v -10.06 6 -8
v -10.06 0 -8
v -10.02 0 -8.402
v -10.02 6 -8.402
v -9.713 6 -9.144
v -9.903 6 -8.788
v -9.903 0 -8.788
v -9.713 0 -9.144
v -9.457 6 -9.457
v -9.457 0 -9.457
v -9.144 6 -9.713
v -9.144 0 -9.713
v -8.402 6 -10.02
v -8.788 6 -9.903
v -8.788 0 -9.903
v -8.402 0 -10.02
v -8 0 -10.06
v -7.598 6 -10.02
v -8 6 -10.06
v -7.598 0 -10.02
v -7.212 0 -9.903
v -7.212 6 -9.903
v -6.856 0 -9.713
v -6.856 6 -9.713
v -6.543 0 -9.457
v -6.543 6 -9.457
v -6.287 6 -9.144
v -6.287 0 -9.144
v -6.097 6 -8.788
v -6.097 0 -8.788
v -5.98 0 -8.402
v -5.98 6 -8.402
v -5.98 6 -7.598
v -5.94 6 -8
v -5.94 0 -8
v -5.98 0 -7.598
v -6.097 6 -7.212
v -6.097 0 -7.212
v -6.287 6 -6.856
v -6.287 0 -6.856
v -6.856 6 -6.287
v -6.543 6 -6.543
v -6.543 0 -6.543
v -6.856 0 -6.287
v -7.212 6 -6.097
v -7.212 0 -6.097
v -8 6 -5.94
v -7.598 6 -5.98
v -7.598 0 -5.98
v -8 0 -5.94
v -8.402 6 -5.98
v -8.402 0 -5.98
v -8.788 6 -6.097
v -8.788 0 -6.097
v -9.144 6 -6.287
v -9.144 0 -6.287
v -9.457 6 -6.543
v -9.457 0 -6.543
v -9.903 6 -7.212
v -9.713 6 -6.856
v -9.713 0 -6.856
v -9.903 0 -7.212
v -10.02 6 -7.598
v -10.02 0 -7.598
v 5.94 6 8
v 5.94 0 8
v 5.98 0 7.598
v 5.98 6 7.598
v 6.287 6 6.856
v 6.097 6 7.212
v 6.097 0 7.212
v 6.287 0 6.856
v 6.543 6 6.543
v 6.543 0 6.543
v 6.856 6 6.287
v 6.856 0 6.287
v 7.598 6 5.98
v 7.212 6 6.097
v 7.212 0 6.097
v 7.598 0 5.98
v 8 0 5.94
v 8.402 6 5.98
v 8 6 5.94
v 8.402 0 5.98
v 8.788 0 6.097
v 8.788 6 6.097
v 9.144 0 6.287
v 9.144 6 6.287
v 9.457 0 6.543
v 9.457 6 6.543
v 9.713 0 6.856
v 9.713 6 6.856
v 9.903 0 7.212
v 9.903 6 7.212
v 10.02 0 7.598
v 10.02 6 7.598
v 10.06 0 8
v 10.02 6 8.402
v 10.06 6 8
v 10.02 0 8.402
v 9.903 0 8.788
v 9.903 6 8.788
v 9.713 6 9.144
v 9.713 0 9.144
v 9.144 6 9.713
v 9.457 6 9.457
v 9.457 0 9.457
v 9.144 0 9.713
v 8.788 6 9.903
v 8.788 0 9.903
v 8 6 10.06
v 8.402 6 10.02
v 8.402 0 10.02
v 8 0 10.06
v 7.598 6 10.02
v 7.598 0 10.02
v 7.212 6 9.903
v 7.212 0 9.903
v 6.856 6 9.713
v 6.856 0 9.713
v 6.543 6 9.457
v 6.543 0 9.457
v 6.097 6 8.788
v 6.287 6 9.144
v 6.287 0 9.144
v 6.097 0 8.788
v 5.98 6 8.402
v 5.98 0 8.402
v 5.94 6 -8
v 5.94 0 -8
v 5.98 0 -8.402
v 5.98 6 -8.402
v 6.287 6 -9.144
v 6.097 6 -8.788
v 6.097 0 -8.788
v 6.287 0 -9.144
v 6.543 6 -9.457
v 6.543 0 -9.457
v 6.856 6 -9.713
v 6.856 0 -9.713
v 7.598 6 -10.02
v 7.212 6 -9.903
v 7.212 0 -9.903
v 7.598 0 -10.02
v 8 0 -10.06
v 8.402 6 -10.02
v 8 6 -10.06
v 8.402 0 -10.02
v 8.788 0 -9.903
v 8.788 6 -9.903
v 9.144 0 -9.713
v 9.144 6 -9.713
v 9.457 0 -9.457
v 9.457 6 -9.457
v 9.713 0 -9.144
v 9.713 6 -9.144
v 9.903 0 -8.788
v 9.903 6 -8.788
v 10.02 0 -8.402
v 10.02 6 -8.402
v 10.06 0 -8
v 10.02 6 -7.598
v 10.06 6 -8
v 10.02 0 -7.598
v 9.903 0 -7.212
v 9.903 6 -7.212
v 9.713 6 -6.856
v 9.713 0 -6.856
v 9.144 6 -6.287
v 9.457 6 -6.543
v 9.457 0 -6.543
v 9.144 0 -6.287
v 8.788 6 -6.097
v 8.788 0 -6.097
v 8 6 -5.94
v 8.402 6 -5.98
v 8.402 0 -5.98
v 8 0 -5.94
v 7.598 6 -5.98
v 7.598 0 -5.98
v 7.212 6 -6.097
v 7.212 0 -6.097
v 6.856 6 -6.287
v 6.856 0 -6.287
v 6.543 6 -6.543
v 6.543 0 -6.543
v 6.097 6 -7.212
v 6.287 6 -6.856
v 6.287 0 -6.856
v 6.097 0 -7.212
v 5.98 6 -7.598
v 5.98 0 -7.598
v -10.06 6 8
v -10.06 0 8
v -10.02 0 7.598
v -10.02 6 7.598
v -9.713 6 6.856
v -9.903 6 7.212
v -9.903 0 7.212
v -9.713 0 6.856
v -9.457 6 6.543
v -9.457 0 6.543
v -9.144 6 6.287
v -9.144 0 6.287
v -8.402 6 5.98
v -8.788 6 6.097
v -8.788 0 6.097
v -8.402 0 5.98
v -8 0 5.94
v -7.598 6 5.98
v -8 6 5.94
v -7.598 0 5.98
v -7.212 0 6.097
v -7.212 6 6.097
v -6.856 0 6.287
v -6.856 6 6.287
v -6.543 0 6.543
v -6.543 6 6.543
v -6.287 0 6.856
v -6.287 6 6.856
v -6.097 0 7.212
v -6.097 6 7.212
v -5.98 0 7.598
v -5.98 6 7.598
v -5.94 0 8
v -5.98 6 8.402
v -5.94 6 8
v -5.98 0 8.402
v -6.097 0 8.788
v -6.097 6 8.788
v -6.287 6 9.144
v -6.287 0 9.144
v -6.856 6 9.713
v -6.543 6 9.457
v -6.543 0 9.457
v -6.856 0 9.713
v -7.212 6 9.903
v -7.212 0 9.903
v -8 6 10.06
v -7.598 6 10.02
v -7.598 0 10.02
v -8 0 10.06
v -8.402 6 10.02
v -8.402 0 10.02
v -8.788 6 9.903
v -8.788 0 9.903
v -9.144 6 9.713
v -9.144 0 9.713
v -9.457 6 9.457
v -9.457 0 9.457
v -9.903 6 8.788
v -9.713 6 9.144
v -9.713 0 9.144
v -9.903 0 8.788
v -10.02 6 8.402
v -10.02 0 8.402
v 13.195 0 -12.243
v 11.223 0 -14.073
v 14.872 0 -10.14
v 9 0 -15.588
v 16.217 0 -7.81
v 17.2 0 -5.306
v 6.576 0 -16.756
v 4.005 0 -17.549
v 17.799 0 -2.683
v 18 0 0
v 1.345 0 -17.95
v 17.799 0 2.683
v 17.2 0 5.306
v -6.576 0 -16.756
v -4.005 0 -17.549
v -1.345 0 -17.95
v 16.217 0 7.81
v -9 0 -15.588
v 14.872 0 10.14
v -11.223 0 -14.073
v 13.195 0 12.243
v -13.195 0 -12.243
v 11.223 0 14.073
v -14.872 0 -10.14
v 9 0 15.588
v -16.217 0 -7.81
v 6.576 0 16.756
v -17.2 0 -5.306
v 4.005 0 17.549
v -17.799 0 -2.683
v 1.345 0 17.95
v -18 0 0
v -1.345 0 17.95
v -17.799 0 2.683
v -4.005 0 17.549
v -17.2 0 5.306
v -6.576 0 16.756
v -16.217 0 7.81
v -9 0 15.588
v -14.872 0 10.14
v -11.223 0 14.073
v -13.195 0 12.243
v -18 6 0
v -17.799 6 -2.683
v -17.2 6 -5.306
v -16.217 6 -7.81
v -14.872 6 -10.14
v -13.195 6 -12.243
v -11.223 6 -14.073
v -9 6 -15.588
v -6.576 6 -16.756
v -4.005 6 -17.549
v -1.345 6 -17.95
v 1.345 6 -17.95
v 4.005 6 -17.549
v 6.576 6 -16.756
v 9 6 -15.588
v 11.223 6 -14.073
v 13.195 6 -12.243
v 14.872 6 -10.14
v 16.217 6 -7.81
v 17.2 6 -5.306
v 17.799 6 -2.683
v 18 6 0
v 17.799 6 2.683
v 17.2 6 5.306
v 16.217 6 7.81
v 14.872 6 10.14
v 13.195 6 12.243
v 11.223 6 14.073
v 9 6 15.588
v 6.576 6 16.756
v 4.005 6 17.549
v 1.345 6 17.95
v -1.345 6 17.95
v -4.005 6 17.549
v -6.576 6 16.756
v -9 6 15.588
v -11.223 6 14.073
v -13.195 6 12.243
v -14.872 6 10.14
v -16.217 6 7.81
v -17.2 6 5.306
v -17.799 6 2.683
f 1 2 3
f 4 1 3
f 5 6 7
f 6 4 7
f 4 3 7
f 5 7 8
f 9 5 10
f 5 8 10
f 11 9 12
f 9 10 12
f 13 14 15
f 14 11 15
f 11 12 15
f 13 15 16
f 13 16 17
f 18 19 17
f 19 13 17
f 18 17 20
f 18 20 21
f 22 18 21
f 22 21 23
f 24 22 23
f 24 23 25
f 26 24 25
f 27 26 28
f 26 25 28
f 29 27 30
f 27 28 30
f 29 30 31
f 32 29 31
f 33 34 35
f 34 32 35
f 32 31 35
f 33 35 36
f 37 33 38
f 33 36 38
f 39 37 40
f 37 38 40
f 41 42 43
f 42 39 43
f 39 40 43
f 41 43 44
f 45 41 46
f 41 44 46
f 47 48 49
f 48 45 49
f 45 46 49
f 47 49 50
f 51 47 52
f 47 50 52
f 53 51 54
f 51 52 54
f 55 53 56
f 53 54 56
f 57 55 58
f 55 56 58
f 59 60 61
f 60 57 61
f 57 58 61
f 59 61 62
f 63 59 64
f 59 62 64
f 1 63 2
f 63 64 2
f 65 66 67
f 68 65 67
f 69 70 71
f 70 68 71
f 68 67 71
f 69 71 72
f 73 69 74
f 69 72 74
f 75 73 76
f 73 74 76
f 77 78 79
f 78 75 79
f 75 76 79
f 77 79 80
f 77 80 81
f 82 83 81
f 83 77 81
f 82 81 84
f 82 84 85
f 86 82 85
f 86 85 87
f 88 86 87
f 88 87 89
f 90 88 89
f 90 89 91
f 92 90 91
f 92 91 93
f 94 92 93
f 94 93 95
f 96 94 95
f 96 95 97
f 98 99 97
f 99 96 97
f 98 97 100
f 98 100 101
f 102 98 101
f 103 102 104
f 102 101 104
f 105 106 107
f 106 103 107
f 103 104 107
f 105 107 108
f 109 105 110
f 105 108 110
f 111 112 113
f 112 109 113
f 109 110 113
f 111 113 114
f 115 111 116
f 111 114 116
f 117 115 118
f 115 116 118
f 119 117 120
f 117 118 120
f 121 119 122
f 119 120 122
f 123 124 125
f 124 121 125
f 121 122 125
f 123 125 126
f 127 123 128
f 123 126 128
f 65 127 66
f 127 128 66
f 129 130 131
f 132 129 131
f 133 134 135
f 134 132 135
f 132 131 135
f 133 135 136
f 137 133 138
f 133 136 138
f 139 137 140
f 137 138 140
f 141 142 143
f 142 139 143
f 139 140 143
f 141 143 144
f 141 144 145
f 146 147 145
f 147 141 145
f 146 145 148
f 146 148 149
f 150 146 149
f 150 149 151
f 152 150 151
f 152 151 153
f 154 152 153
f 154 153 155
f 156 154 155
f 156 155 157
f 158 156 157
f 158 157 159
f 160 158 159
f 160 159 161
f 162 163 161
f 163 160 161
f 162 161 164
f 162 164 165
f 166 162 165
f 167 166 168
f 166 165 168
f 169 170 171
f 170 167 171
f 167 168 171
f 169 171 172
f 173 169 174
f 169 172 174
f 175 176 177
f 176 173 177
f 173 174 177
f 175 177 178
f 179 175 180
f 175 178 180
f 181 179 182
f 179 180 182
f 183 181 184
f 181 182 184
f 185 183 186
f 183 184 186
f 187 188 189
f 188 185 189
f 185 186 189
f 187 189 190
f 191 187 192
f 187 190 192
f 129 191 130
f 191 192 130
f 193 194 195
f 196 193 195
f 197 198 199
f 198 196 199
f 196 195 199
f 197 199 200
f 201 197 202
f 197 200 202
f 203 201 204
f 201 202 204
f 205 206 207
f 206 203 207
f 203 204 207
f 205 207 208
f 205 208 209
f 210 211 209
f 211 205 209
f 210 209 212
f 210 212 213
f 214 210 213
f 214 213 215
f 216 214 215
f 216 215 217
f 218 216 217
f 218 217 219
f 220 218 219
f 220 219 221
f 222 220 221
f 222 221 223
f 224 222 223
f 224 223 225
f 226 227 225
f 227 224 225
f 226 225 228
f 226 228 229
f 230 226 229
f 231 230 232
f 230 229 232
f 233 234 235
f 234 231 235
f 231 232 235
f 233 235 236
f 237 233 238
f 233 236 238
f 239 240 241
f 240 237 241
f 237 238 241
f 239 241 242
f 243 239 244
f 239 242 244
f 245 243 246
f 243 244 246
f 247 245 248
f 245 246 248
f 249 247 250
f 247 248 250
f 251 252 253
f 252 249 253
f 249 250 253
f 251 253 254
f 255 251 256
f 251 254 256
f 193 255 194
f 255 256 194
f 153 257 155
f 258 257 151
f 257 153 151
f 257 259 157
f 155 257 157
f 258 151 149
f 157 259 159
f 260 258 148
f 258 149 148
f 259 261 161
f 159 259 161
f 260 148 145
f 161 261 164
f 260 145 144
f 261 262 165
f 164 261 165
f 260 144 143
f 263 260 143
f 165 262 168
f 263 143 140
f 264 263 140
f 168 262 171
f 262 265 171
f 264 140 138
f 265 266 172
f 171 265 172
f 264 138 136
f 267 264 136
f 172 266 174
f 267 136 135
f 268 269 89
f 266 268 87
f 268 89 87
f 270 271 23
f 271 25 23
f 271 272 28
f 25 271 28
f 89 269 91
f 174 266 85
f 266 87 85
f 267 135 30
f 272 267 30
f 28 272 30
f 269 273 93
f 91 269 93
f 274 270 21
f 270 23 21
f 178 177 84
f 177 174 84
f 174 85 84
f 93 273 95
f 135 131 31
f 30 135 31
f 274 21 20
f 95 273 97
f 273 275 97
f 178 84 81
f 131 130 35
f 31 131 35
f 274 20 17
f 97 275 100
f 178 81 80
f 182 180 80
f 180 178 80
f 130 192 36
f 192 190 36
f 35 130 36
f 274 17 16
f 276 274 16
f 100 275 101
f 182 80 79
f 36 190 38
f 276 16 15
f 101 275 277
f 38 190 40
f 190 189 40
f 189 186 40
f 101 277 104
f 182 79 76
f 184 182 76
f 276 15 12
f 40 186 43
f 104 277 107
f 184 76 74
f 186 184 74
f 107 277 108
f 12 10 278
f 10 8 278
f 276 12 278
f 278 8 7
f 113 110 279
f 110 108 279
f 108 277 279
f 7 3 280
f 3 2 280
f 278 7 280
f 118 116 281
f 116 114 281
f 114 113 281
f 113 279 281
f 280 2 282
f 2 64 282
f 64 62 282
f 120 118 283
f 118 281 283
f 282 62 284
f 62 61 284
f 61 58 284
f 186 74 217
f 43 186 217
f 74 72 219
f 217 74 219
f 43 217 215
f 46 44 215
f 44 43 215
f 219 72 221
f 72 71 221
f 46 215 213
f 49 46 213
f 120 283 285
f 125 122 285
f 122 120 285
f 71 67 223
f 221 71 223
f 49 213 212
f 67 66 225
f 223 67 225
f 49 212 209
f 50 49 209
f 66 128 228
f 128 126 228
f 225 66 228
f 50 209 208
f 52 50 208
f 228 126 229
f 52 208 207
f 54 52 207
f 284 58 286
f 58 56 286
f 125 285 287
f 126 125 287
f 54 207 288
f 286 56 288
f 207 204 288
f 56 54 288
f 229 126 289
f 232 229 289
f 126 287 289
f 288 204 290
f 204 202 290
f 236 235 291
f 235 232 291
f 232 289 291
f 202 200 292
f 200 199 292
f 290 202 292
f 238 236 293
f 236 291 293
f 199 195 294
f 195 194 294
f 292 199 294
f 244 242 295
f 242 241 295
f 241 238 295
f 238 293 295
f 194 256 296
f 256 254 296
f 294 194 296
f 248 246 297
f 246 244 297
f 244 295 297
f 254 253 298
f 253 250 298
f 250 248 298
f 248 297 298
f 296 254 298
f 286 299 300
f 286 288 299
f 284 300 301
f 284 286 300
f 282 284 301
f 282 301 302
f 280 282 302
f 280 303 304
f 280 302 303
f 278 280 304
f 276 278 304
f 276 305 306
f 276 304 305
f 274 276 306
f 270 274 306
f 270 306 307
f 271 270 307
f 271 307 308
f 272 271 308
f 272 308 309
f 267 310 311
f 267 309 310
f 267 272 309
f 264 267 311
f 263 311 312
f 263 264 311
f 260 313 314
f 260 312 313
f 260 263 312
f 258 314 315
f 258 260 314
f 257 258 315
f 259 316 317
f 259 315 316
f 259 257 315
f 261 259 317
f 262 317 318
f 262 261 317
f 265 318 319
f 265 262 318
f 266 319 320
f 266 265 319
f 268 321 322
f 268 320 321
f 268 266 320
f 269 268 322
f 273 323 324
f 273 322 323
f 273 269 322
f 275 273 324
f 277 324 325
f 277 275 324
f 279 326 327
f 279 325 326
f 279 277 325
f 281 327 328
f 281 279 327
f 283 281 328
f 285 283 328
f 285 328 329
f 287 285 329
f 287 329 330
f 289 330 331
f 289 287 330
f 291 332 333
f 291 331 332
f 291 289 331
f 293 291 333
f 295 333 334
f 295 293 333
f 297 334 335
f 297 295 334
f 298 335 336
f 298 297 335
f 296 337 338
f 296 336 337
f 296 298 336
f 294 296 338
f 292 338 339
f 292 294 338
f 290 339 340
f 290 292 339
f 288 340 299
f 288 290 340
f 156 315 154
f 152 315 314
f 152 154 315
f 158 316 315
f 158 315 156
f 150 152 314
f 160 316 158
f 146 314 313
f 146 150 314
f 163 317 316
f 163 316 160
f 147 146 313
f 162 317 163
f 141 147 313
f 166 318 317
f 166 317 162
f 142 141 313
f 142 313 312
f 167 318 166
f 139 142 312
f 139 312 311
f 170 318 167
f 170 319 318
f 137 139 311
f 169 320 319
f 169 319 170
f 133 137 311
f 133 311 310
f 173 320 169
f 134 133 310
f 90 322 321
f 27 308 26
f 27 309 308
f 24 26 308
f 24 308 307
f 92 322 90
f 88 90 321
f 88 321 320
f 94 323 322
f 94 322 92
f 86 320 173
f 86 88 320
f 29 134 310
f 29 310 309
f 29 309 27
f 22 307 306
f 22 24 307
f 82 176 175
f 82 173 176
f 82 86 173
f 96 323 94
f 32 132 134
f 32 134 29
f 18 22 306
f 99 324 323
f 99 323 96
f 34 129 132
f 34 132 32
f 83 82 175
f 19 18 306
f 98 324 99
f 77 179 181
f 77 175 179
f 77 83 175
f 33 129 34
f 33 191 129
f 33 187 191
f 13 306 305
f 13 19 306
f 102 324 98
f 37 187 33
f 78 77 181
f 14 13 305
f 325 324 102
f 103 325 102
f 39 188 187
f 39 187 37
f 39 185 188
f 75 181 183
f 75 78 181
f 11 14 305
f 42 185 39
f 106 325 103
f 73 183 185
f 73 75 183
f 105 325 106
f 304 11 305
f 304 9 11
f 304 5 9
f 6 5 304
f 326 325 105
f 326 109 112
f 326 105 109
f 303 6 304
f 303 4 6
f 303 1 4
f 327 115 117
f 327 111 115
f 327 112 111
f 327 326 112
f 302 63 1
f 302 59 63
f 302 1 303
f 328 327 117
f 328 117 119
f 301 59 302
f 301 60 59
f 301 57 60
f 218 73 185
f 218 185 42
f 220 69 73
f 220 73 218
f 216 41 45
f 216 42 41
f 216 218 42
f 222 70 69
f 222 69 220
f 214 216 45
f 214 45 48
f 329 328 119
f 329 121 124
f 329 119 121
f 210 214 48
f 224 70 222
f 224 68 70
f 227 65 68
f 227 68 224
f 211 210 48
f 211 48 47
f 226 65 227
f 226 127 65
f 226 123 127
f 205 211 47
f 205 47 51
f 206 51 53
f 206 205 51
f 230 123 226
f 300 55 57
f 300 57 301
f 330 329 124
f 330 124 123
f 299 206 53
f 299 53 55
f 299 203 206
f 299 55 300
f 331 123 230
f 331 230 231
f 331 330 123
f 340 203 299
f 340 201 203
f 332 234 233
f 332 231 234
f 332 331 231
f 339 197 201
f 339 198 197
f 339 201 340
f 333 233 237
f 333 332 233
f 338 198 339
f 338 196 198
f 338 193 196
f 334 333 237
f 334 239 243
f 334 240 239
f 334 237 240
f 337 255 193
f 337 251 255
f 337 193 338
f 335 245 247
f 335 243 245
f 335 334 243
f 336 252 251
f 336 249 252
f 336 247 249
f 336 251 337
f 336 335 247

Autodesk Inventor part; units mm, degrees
ref_plane "YZ Plane" through (0, 0, 0) normal (1, 0, 0) x (0, 1, 0)
ref_plane "XZ Plane" through (0, 0, 0) normal (0, 1, 0) x (-1, 0, 0)
ref_plane "XY Plane" through (0, 0, 0) normal (0, 0, 1) x (1, 0, 0)
sketch "Sketch1" plane through (0, 0, 0) normal (0, 1, 0) x (-1, 0, 0)
  circle A0 centre (0, 0) radius 18
  circle A1 centre (8, -8) radius 2.06
  circle A2 centre (8, 8) radius 2.06
  circle A3 centre (-8, 8) radius 2.06
  circle A4 centre (-8, -8) radius 2.06
  dimension "d0" = 36
  dimension "d1" = 4.12
  dimension "d2" = 8
  dimension "d3" = 8
  dimension "d6" = 360
extrude "Extrusion1" add sketch "Sketch1" along normal blind 6
properties part number "EndEffector_Stage1BearingClamp"
